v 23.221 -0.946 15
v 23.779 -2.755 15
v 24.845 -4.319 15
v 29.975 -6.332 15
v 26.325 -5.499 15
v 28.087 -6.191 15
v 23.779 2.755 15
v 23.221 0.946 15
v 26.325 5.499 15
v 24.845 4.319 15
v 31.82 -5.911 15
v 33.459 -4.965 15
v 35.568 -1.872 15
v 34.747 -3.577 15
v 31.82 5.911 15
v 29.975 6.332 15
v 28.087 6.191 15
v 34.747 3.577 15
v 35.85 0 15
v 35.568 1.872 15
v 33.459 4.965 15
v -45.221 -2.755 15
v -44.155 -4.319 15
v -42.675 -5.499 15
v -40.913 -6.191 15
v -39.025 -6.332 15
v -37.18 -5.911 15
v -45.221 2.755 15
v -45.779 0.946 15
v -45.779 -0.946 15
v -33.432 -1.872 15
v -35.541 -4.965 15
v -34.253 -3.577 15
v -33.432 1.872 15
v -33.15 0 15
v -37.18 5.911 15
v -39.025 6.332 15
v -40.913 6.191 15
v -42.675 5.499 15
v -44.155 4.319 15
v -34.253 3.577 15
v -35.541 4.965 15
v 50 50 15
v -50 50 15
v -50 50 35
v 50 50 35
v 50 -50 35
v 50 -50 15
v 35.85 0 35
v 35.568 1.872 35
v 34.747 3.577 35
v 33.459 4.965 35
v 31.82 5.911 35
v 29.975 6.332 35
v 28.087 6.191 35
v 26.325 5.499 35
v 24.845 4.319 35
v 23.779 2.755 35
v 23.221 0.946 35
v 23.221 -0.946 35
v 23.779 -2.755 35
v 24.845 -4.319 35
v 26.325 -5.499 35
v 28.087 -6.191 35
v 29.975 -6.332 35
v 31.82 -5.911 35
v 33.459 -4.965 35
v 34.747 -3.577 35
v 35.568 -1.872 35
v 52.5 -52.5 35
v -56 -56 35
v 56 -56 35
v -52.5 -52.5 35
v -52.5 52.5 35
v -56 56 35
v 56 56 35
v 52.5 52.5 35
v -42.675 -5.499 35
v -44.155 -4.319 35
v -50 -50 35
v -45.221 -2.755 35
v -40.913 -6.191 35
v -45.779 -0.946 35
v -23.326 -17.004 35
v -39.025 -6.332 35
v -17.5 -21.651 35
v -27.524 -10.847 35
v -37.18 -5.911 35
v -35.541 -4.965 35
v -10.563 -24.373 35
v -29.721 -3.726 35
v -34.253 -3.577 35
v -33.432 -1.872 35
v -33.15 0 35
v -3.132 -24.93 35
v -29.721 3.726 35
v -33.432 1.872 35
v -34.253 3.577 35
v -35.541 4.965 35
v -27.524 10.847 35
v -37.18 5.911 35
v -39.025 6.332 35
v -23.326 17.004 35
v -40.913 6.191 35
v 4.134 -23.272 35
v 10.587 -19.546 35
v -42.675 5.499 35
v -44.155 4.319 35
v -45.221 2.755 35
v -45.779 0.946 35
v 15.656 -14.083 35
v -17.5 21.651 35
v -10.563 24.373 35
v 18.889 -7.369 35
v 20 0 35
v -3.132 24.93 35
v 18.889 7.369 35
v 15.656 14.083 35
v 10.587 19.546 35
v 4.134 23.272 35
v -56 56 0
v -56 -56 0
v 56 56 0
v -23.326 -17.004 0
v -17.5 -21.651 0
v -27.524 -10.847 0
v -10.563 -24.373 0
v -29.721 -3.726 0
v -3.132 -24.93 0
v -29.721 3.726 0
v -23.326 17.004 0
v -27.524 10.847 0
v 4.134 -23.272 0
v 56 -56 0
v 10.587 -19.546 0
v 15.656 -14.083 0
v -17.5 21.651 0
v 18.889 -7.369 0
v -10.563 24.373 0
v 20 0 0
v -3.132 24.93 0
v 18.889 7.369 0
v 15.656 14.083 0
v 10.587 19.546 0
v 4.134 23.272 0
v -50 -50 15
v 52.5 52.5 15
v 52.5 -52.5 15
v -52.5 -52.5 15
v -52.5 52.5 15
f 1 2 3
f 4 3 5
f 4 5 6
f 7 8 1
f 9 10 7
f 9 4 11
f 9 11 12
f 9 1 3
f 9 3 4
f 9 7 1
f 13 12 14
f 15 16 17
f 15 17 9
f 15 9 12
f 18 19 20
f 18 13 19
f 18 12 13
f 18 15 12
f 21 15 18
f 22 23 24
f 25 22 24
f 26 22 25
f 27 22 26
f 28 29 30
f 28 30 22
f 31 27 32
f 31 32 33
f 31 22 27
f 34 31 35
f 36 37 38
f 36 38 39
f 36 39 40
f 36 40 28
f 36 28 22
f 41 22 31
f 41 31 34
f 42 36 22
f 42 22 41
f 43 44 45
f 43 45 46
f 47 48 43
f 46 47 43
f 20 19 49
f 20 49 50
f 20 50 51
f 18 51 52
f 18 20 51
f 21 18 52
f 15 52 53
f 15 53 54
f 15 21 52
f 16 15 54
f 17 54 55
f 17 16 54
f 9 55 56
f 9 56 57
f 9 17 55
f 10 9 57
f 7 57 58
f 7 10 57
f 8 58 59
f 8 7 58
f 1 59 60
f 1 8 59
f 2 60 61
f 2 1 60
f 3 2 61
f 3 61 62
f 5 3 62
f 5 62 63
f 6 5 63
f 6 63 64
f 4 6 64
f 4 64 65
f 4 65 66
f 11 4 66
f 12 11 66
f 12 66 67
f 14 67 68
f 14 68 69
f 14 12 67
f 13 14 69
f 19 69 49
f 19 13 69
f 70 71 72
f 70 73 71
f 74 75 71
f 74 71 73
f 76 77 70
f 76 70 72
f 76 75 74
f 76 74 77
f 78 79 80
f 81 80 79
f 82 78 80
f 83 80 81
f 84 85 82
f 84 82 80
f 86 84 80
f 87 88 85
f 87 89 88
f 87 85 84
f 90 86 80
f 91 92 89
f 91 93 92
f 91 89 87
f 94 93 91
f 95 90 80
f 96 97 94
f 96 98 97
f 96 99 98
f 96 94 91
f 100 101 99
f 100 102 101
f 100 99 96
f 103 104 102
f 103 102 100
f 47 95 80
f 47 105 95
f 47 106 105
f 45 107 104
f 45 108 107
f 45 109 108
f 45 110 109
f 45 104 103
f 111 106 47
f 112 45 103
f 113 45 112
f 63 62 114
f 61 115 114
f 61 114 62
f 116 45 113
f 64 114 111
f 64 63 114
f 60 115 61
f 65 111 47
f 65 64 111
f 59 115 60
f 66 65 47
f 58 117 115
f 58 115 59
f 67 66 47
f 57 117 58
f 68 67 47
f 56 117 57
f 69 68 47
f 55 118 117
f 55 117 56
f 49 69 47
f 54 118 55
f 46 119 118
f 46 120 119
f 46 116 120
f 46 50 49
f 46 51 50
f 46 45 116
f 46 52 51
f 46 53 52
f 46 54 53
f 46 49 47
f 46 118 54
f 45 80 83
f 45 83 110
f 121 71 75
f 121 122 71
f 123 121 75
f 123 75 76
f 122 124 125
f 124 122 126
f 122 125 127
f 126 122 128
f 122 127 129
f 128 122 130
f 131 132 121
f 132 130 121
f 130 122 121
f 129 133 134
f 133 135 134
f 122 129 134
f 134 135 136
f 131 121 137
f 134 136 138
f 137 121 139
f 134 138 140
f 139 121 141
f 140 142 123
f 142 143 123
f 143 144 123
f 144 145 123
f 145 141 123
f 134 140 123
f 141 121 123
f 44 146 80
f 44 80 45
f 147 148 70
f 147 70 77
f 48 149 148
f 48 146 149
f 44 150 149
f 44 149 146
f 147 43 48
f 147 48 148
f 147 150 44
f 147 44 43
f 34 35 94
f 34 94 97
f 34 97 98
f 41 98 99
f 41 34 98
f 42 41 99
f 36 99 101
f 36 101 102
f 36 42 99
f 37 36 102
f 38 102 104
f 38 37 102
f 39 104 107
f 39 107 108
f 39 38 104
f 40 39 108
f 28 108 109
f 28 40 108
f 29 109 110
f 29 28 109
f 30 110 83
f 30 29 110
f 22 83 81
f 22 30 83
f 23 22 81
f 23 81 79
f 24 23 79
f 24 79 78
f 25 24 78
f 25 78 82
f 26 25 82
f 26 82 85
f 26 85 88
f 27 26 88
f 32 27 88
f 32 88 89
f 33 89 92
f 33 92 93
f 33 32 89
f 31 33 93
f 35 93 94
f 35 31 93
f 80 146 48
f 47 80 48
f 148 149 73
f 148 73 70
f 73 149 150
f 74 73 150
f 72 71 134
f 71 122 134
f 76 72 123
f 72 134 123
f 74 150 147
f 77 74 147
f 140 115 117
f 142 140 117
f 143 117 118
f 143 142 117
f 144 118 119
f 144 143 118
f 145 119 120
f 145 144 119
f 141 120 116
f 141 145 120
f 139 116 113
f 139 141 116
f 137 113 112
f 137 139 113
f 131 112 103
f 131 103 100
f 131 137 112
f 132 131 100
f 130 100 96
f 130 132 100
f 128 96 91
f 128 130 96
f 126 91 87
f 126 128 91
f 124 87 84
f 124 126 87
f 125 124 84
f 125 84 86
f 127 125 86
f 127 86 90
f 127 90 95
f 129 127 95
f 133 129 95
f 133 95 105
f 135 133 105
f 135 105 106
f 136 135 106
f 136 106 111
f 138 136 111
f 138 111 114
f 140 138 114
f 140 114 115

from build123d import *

# Parameters (mm, degrees)
SKETCH2_W           = 112
SKETCH2_H           = 112
SKETCH2_R           = 25
BOSS_EXTRUDE1_DEPTH = 15
SKETCH3_W           = 112
SKETCH3_H           = 112
SKETCH3_W_2         = 105
SKETCH3_H_2         = 105
SKETCH3_W_3         = 100
SKETCH3_H_3         = 100
SKETCH3_R           = 6.35
SKETCH3_R_2         = 25
BOSS_EXTRUDE2_DEPTH = 20


with BuildPart() as part:
    # Sketch2 → Boss-Extrude1 (new body)
    with BuildSketch(Plane.XY):
        Rectangle(SKETCH2_W, SKETCH2_H)
        with Locations((-5, 0)):
            Circle(SKETCH2_R, mode=Mode.SUBTRACT)
    extrude(amount=BOSS_EXTRUDE1_DEPTH)

    # Sketch3 → Boss-Extrude2 (add)
    # profile 1 of 2: a face of its own
    with BuildSketch(Plane.XY.offset(15)):
        Rectangle(SKETCH3_W, SKETCH3_H)
        Rectangle(SKETCH3_W_2, SKETCH3_H_2, mode=Mode.SUBTRACT)
    # profile 2 of 2: a face of its own
    with BuildSketch(Plane.XY.offset(15)):
        Rectangle(SKETCH3_W_3, SKETCH3_H_3)
        with Locations((-39.5, 0)):
            Circle(SKETCH3_R, mode=Mode.SUBTRACT)
        with Locations((-5, 0)):
            Circle(SKETCH3_R_2, mode=Mode.SUBTRACT)
        with Locations((29.5, 0)):
            Circle(SKETCH3_R, mode=Mode.SUBTRACT)
    extrude(amount=BOSS_EXTRUDE2_DEPTH)


solid = part.part
